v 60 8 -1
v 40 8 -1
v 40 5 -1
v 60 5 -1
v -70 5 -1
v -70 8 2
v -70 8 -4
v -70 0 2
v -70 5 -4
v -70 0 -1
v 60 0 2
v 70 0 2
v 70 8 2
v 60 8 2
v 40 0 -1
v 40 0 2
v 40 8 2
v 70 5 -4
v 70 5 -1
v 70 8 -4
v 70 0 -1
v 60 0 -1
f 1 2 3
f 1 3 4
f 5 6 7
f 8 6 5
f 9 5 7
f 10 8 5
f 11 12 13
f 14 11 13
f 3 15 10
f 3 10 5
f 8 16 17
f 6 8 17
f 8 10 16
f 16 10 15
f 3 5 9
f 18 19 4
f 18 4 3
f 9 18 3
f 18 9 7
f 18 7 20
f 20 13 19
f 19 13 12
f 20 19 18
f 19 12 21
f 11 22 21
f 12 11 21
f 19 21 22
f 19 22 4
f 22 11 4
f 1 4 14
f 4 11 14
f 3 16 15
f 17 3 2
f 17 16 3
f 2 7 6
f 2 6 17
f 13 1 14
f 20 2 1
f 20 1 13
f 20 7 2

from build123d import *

# Parameters (mm, degrees)
SKETCH1_W           = 140
SKETCH1_H           = 8
BOSS_EXTRUDE1_DEPTH = 8
SKETCH2_W           = 3
SKETCH2_H           = 5
SKETCH2_W_2         = 2
SKETCH2_H_2         = 8
CUT_EXTRUDE1_DEPTH  = 140
SKETCH4_W           = 20
SKETCH4_H           = 8
CUT_EXTRUDE2_DEPTH  = 3


with BuildPart() as part:
    # Sketch1 → Boss-Extrude1 (new body)
    with BuildSketch(Plane(origin=(0, 0, 0), x_dir=(1, 0, 0), z_dir=(0, 1, 0))):
        Rectangle(SKETCH1_W, SKETCH1_H)
    extrude(amount=BOSS_EXTRUDE1_DEPTH)

    # Sketch2 → Cut-Extrude1 (cut)
    with BuildSketch(Plane(origin=(70, 0, 0), x_dir=(0, 0, -1), z_dir=(1, 0, 0))):
        with Locations((2.5, 2.5)):
            Rectangle(SKETCH2_W, SKETCH2_H)
        with Locations((-3, 4)):
            Rectangle(SKETCH2_W_2, SKETCH2_H_2)
    extrude(amount=-CUT_EXTRUDE1_DEPTH, mode=Mode.SUBTRACT)

    # Sketch4 → Cut-Extrude2 (cut)
    with BuildSketch(Plane.XY.offset(2)):
        with Locations((50, 4)):
            Rectangle(SKETCH4_W, SKETCH4_H)
    extrude(amount=-CUT_EXTRUDE2_DEPTH, mode=Mode.SUBTRACT)


solid = part.part
